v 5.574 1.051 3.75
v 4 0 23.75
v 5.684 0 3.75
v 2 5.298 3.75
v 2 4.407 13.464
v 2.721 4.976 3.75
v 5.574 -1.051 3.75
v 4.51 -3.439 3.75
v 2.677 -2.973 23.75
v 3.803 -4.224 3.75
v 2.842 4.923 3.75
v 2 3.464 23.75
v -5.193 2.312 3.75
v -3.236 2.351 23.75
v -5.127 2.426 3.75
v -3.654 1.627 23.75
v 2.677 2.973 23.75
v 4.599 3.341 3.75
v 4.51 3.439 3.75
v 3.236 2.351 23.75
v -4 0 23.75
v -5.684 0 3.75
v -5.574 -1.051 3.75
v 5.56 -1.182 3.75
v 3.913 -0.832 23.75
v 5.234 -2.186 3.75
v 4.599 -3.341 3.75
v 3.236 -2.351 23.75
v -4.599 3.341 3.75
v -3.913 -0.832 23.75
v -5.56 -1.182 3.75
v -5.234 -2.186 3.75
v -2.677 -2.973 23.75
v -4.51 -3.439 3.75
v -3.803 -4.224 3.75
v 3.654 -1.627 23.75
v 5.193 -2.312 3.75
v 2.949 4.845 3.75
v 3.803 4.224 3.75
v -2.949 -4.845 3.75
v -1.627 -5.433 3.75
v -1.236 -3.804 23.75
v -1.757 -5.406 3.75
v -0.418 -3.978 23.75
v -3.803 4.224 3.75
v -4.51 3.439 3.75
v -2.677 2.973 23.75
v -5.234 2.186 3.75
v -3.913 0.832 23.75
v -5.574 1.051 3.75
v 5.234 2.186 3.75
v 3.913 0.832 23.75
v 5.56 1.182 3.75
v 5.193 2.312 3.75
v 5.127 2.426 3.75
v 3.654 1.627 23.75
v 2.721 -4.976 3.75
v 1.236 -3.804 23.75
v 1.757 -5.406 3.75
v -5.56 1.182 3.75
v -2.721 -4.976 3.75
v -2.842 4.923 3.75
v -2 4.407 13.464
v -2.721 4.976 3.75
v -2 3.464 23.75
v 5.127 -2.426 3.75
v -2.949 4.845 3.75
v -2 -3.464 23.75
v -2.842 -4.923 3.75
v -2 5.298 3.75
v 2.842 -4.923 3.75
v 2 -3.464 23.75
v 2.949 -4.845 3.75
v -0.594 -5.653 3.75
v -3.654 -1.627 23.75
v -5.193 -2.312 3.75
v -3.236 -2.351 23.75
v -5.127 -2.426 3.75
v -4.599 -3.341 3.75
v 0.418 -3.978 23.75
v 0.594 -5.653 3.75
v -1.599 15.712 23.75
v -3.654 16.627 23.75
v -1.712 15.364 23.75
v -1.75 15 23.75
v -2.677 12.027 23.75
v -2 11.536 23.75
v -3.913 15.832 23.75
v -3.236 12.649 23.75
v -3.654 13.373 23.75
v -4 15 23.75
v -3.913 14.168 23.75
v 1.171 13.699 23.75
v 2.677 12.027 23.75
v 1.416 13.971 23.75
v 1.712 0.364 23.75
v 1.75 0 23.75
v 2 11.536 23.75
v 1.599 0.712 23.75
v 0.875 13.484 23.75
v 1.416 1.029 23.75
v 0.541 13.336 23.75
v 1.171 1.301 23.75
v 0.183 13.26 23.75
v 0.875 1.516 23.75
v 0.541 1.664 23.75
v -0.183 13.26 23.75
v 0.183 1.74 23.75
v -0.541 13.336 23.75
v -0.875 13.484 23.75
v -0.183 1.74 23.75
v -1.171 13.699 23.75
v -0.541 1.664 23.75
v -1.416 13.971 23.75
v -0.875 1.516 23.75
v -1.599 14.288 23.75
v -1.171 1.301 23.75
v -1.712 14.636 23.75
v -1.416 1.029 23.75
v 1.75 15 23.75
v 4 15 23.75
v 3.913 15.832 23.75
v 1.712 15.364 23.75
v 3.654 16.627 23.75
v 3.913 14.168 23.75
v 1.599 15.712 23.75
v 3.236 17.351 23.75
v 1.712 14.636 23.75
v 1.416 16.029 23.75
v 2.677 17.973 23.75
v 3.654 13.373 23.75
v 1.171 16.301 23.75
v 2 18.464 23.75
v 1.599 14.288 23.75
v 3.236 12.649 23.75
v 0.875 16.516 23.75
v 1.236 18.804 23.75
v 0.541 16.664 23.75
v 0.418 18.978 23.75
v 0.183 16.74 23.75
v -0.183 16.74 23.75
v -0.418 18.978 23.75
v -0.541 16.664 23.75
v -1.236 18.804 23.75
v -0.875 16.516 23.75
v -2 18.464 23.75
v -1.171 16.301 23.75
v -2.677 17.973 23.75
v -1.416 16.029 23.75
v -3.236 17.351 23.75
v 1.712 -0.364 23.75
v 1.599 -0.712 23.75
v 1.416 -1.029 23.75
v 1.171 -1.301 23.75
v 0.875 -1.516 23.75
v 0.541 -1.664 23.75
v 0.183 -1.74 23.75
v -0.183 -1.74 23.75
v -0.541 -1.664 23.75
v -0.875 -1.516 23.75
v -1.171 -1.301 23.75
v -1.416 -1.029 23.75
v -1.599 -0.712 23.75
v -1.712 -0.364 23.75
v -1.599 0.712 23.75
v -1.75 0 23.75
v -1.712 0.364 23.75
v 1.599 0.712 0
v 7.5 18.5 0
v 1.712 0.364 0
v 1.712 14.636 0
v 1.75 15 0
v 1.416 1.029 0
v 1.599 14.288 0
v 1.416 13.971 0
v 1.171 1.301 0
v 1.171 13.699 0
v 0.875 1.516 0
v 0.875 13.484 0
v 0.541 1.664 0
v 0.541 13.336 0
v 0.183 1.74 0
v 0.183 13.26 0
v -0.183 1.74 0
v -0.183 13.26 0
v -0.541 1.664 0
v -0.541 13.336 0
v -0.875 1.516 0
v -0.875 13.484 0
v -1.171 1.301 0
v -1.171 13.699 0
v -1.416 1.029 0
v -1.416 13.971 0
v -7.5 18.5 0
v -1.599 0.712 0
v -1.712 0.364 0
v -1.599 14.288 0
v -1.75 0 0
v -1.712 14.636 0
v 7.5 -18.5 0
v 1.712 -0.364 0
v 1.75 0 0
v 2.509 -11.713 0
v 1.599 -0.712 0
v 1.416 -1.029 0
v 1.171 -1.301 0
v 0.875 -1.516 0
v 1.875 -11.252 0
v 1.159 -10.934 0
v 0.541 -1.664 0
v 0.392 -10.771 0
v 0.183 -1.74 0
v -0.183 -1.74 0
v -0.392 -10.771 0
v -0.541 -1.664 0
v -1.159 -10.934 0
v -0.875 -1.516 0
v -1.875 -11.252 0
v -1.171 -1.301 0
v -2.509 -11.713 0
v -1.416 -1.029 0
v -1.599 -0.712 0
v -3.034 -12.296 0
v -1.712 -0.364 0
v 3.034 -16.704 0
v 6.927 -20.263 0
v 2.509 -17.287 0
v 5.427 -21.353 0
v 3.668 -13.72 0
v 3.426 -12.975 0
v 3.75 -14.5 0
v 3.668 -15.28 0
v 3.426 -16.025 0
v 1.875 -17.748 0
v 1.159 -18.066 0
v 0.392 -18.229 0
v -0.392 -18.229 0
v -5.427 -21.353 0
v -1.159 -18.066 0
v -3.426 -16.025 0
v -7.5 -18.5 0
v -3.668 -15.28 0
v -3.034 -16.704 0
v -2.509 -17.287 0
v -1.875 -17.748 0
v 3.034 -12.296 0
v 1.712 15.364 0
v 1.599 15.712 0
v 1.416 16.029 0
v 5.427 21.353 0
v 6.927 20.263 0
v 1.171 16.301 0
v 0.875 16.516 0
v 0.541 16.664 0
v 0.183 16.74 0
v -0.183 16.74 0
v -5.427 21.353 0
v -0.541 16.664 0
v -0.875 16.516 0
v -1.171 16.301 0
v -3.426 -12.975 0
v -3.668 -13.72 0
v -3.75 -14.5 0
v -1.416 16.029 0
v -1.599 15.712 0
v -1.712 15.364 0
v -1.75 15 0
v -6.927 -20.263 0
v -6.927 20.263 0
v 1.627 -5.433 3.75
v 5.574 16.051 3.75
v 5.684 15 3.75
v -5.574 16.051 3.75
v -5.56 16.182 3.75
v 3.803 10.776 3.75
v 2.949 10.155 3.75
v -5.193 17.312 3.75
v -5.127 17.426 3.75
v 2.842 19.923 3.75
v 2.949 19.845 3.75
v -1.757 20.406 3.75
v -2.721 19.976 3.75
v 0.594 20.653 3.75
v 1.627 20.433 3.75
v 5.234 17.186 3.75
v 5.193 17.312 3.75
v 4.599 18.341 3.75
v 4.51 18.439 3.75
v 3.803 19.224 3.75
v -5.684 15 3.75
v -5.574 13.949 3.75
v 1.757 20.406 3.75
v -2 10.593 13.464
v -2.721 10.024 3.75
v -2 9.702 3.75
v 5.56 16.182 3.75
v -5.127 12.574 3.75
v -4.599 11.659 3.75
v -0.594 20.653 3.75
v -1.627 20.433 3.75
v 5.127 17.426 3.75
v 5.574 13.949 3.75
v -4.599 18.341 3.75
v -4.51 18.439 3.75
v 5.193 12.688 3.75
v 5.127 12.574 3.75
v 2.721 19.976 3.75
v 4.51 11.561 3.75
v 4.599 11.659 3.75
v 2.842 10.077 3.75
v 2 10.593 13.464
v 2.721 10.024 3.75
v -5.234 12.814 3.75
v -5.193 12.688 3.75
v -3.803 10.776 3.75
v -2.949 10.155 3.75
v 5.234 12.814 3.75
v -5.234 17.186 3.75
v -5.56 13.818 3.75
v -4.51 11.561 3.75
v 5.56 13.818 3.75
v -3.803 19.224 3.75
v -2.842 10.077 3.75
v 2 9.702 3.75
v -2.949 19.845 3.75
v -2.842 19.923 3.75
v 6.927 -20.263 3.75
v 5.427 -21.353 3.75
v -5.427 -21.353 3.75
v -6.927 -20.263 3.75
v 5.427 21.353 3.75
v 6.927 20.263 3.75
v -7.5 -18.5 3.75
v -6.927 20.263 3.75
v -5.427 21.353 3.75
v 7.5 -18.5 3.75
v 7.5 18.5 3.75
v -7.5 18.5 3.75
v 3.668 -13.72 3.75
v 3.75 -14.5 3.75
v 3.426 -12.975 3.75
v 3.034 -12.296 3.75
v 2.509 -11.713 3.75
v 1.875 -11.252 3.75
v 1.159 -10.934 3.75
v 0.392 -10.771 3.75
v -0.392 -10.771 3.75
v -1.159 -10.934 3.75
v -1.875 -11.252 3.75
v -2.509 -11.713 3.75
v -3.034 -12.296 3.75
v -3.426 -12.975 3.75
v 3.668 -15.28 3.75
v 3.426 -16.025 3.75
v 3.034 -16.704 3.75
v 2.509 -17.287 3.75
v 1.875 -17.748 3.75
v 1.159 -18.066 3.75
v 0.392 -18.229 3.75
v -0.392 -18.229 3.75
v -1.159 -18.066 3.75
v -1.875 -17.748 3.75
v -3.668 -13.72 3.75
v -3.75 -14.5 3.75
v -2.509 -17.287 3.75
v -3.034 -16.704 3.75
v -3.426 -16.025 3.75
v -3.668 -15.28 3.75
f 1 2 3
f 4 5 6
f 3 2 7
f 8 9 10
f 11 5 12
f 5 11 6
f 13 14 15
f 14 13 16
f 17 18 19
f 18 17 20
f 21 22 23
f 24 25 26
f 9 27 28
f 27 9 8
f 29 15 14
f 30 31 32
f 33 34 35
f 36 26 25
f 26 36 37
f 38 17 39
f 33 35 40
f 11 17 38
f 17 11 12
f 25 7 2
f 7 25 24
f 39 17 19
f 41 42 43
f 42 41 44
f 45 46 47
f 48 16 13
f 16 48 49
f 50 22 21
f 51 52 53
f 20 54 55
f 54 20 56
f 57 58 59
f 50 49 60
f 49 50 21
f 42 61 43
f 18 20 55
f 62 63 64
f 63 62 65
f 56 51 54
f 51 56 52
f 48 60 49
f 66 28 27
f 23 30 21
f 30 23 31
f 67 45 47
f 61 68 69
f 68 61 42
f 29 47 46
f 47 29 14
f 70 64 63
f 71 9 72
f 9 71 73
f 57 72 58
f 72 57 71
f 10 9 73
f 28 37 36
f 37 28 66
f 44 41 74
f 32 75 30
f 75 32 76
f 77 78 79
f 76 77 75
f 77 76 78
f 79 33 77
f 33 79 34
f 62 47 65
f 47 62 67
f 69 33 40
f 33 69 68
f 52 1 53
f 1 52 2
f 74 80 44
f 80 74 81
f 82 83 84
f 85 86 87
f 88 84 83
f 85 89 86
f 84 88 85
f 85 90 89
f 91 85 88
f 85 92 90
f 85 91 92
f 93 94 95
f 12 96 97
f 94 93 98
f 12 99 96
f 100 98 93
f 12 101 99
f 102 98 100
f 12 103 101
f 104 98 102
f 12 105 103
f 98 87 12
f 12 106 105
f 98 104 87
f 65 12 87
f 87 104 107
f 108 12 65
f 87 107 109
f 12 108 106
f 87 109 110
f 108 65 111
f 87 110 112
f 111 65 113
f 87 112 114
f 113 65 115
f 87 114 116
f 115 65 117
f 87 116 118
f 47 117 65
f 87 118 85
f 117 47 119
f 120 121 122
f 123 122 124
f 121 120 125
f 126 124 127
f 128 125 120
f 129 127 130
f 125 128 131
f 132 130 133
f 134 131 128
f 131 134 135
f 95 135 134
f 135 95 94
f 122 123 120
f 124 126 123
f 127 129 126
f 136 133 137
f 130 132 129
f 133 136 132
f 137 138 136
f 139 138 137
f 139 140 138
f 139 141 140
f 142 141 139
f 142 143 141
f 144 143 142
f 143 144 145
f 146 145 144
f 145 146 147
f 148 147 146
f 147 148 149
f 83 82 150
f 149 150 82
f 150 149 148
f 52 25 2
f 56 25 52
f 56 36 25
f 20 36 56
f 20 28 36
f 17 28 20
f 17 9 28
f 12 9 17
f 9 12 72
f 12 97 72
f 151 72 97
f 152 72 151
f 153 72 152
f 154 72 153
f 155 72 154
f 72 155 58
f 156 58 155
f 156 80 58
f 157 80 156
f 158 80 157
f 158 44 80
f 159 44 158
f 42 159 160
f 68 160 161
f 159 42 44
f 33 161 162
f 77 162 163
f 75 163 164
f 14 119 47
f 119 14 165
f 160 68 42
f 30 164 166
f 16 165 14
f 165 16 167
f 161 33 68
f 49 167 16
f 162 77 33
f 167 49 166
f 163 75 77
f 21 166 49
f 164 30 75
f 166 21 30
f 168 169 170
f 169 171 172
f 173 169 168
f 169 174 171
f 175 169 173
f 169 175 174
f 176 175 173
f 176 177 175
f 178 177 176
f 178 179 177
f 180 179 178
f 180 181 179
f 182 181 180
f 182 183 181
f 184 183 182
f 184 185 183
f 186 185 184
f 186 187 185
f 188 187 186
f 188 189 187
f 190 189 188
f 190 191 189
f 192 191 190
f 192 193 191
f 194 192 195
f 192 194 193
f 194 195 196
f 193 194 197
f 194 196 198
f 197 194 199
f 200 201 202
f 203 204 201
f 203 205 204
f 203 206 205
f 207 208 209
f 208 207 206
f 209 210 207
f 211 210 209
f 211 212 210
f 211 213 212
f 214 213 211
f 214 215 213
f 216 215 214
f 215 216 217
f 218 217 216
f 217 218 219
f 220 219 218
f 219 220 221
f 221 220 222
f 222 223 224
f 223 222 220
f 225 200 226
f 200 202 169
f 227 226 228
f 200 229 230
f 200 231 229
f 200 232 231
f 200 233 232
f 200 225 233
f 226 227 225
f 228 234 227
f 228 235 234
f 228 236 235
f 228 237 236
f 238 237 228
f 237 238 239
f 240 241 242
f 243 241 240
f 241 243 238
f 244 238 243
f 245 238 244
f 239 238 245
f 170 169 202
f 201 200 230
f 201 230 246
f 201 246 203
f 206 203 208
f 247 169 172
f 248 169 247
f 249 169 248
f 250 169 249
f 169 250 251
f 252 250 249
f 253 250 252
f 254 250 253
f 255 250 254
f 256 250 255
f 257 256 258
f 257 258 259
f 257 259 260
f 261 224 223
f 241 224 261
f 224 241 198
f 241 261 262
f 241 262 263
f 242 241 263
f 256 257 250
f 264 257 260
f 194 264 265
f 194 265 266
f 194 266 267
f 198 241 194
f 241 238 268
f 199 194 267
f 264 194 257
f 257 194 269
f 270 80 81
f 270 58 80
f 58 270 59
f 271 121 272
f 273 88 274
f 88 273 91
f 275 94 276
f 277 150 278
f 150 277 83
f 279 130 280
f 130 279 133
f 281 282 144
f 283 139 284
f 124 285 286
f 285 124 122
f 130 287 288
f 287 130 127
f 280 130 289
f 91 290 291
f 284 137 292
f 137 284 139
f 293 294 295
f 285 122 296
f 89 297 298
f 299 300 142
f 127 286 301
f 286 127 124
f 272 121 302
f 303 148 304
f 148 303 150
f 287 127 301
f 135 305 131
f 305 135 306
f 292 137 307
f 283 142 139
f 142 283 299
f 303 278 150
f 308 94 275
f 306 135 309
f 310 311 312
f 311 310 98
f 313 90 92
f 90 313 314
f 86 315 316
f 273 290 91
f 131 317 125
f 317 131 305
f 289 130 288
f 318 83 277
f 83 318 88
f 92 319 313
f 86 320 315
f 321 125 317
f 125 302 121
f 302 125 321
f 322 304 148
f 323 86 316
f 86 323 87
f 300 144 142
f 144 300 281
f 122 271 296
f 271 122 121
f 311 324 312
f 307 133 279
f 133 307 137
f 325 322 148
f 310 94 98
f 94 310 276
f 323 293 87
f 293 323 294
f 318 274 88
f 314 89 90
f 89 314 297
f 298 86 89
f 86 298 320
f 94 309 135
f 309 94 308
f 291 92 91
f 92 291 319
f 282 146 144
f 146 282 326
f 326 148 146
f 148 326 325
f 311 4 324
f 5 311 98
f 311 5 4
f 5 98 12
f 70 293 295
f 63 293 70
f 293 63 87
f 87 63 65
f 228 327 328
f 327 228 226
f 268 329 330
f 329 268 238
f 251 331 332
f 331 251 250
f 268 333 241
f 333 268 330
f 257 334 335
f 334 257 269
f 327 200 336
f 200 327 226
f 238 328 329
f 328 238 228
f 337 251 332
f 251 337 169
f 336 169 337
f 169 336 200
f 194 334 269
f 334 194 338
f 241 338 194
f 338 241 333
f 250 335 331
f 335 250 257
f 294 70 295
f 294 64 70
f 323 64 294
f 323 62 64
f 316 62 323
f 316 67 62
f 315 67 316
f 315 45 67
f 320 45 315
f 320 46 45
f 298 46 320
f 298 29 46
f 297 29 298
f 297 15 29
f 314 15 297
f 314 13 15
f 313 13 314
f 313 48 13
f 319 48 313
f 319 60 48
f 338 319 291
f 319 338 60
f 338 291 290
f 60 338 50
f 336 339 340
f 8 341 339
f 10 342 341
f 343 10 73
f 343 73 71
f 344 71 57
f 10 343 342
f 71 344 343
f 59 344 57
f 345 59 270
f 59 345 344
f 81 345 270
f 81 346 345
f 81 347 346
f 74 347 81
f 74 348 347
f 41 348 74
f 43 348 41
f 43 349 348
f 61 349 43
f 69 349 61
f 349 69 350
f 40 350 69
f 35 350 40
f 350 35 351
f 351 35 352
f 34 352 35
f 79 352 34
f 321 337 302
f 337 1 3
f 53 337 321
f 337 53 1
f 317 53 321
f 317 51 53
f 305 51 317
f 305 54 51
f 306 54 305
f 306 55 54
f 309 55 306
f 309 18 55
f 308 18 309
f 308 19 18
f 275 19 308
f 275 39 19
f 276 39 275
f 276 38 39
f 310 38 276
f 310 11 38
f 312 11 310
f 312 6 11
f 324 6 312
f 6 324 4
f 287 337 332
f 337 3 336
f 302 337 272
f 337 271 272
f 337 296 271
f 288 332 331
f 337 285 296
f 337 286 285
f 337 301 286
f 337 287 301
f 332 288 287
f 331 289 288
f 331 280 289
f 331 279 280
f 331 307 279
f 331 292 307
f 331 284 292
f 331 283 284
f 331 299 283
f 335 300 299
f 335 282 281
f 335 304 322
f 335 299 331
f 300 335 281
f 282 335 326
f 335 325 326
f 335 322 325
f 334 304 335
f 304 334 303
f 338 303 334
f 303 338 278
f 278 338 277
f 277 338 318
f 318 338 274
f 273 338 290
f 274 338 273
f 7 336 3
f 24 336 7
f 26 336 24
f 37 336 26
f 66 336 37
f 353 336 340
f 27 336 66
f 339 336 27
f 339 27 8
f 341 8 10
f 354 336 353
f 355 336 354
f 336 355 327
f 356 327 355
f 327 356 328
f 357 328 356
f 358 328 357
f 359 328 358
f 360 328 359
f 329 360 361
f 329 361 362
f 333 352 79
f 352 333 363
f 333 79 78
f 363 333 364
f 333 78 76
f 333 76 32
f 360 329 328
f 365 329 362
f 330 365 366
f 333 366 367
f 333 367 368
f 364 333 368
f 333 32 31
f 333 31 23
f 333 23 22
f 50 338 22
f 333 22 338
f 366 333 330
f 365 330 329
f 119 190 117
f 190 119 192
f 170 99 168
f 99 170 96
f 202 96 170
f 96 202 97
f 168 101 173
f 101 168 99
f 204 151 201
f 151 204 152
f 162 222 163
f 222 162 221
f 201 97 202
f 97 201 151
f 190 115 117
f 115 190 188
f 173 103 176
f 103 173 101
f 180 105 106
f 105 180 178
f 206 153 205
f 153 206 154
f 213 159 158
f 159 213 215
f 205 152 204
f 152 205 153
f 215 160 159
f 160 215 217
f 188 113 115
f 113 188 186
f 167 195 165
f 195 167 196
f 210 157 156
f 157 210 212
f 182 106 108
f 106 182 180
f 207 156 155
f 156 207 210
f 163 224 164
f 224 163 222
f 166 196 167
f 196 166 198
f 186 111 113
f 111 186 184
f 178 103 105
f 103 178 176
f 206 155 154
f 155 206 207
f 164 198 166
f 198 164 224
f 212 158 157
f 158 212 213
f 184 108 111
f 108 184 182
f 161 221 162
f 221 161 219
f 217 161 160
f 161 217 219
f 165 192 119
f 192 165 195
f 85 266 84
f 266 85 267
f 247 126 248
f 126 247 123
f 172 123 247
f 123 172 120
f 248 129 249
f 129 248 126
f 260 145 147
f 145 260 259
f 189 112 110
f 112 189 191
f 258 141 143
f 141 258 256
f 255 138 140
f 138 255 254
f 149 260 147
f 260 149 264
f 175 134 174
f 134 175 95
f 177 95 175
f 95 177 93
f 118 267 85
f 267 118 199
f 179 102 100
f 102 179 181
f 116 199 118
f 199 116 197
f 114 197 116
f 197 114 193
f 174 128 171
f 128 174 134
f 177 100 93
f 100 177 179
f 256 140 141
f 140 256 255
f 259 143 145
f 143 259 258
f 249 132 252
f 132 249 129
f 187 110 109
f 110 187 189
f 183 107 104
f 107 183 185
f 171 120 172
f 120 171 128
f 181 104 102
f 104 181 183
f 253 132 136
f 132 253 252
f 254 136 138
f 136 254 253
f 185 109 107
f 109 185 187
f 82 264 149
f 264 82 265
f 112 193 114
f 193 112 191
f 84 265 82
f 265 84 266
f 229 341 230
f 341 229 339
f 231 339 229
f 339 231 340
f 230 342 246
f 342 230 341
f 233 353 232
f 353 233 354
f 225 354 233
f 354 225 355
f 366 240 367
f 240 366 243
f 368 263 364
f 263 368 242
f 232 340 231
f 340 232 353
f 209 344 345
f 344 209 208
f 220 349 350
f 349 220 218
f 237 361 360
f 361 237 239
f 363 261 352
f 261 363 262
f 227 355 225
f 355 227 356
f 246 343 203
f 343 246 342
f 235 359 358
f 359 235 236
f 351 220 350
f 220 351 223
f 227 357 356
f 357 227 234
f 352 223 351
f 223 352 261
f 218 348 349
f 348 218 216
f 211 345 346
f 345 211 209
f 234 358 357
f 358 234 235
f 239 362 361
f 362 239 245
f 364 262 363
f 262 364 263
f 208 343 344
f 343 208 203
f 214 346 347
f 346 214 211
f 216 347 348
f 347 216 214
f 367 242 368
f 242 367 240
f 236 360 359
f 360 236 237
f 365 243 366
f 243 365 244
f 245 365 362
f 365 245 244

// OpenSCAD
// file: dronePlates.scad
/**
 * dronePlates.scad
 * Plate library
 *
 * GNU GPL V3
 * @author: Victor Potenciano
 */

m3Rad = 3.4/2;
cornerR = 4;

/**
 *
 */
module helperDisk(diameter) {
	cylinder(r = diameter/2, h = 0.6, $fn=20);
}

/**
 *
 */
module roundedRect(size, radius) {
	x = size[0];
	y = size[1];
	z = size[2];

	linear_extrude(height=z)
	hull() {
	// place 4 circles in the corners, with the given radius
	translate([(-x/2)+(radius/2), (-y/2)+(radius/2), 0]){ circle(r=radius); }
	translate([(x/2)-(radius/2), (-y/2)+(radius/2), 0]){ circle(r=radius); }
	translate([(-x/2)+(radius/2), (y/2)-(radius/2), 0]){ circle(r=radius); }
	translate([(x/2)-(radius/2), (y/2)-(radius/2), 0]){ circle(r=radius); }
	}
}

/**
 * rounded rectangle triangle with corner at origin
 */
module roundedTriangle(size, radius) {
	x = size[0];
	y = size[1];
	z = size[2];

	linear_extrude(height=z)
	hull() {
	translate([radius, radius, 0]){ circle(r=radius); }
	translate([x-radius, radius, 0]){ circle(r=radius); }
	translate([radius, y-radius, 0]){ circle(r=radius); }
	}
}

/**
 *
 */
module roundRectPlate(w, l, plateThick=3) {
	difference(){
		roundedRect([l+m3Rad*1.75,w+m3Rad*1.75,plateThick], cornerR);
		translate([l/2, w/2, -0.5]) { cylinder(h = plateThick+1, r = m3Rad, $fn=30); }
		translate([-l/2, w/2, -0.5]) { cylinder(h = plateThick+1, r = m3Rad, $fn=30); }
		translate([l/2, -w/2, -0.5]) { cylinder(h = plateThick+1, r = m3Rad, $fn=30); }
		translate([-l/2, -w/2, -0.5]) { cylinder(h = plateThick+1, r = m3Rad, $fn=30); }
	}
}

/**
 *
 */
module crossSquarePlate(l, thick=3) {
	inDist = cornerR*2+4;
	trianL = sqrt((l*l)/2)-inDist;
	centerR = 4;

	difference(){
		roundRectPlate(l, l, thick);
		translate([0, centerR, -0.5]) { 
			rotate([0,0,45]){ roundedTriangle([trianL,trianL,thick+1], cornerR-2); }
		}
		translate([0, -centerR, -0.5]) { 
			rotate([0,0,225]){ roundedTriangle([trianL,trianL,thick+1], cornerR-2); }
		}
		translate([-centerR, 0, -0.5]) { 
			rotate([0,0,135]){ roundedTriangle([trianL,trianL,thick+1], cornerR-2); }
		}
		translate([centerR, 0, -0.5]) { 
			rotate([0,0,-45]){ roundedTriangle([trianL,trianL,thick+1], cornerR-2); }
		}
	}
}

/**
 *
 */
module hShapePlate(w, l, thick=4) {
	inDist = cornerR*2+1;

	difference(){
		roundRectPlate(w, l, thick);
		translate([0, w/4, -0.5]) { roundedRect([l-inDist,w/2-inDist,thick+1], cornerR-2); }
		translate([0, -w/4, -0.5]) { roundedRect([l-inDist,w/2-inDist,thick+1], cornerR-2); }
	}
}

/**
 *
 */
module motorCircleMount(inDia, outDia, thick=3, extraH=false, d1=19, d2=16, holeR=m3Rad ) {
	difference(){
		cylinder(h = thick, r = outDia/2, $fn=30);
		motorCircleMountHoles(inDia, outDia, thick, extraH, d1=d1, d2=d2, holeR=holeR);
	}
}

/**
 *
 */
module motorCircleMountHoles(inDia, outDia, thick=3, extraH=false, d1=19, d2=16, d3=25, holeR=m3Rad) {
	translate([0, 0, -0.5]) { cylinder(h = thick+1, r = inDia/2, $fn=30); }

	for(i=[0:3]) {
		rotate([0,0,90*i]){
		translate([d1/2, 0, -0.5]) cylinder(h = thick+1, r = holeR, $fn=20);
		translate([d2/2, 0, -0.5]) cylinder(h = thick+1, r = holeR, $fn=20);
		translate([d2/2, -holeR, -0.5]) cube(size = [(d1-d2)/2,holeR*2,thick+1]);
		}
	}
	
	if(extraH==true){	
		for(i=[-1,1]) translate([i*d3/2, 0, -0.5]) { cylinder(h = thick+1, r = holeR, $fn=30); }
	}
}

/**
 *
 */
module motorRectMount(w, l, inDia, thick=3) {
	d1=19;
	d2=16;

	difference(){
		roundRectPlate(w, l, thick);
		translate([0, 0, -0.5]) { cylinder(h = thick+1, r = inDia/2, $fn=30); }
		translate([0, d1/2, -0.5]) { cylinder(h = thick+1, r = m3Rad, $fn=30); }
		translate([0, -d1/2, -0.5]) { cylinder(h = thick+1, r = m3Rad, $fn=30); }
		translate([d2/2, 0, -0.5]) { cylinder(h = thick+1, r = m3Rad, $fn=30); }
		translate([-d2/2, 0, -0.5]) { cylinder(h = thick+1, r = m3Rad, $fn=30); }
	}
}

/**
 *
 */
module tube(inDia, outDia, height) {
	difference(){
		cylinder(h = height, r = outDia/2, $fn=50);
		translate([0, 0, -0.5]) { cylinder(h = height+1, r = inDia/2, $fn=30); }
	}
}

/**
 *
 */
module squareTube(inDia, outDia, height) {
	translate([0,0,height/2]){
	difference(){
		cube(size = [outDia,outDia,height], center = true);
		cube(size = [inDia,inDia,height+1], center = true);
	}
	}
}

/**
 *
 */
module djiFlamewheelHoles(height) {
	a = 23;
	b = 16;
	c = 19.5;
	
	translate([a/2, c/2, 0]) { cylinder(h = height, r = m3Rad, $fn=30); }
	translate([-a/2, c/2, 0]) { cylinder(h = height, r = m3Rad, $fn=30); }
	translate([b/2, -c/2, 0]) { cylinder(h = height, r = m3Rad, $fn=30); }
	translate([-b/2, -c/2, 0]) { cylinder(h = height, r = m3Rad, $fn=30); }
}

/**
 *
 */
module djiFlamewheelHolesBotton(height) {
	a1 = 21;
	c = 19.5;
	
	translate([a1/2, c/2, 0]) { cylinder(h = height, r = m3Rad, $fn=30); }
	translate([-a1/2, c/2, 0]) { cylinder(h = height, r = m3Rad, $fn=30); }
}

/**
 *
 */
module propeller(size){
union(){
difference(){
	cylinder(h = 3, r = size/2, center=true, $fn=30);
	cylinder(h = 3.1, r = size/2-2, center=true, $fn=30); 
}
for( i = [-1,1] ){
rotate([0,0,45*i]){ cube(size = [size,4,1], center = true); }
}
}
}

/**
 *
 */
module slot(length, height, rad){
for(i=[-1,1]) translate([i*length/2,0,0]) cylinder(h = height, r = rad, $fn=30);
translate([0,0,height/2]) cube(size = [length,rad*2,height], center = true);
}

 

////////////////////////
// Examples:
////////////////////////

motorCircleMount(8, 25, 3.5);

//roundedRect([50,50,3], 4);

//hShapePlate(79, 25);

//rotate([0,0,45]){roundedTriangle([40,40,3], 4);}

//crossSquarePlate(45, 4);

/*
union(){
motorRectMount(21, 18, 8, 4);
translate([9, 10.5, 0]) {tube(m3Rad*2, 6.5, 6);}
}
*/

/*
difference(){
union(){
hShapePlate(50, 30, 3.5);
translate([-4,-25,0]){cube(size = [8,50,3.5]);}
rotate([0, 0, 45]) {motorCircleMount(8, 35, 3.5);}
}
cylinder(h = 10, r = 4, $fn=100, center=true);
}
*/

//rotate([90,0,0]){ tube(5,10,20); }
//translate([20,0,0]){ squareTube(5, 10, 20); }
// main file
/**
 * adaptor for gopro attachment
 */

use <dronePlates.scad>

m3Rad = 3.5/2;
plateThick = 3.75;

difference(){
union(){

translate([-2,3,0]) cube(size=[4,9,20+plateThick]);
roundedRect([12,40,plateThick],3);
for(i=[0,1]) translate([0,i*15,0]) cylinder(h=20+plateThick,r1=6,r2=4,$fn=30);


}//union

for(i=[0,1]) translate([0,i*15,-0.5]) cylinder(h=30,r=m3Rad,$fn=30);
translate([0,-(22-15/2),-0.5]) cylinder(h=plateThick+1,r=7.5/2,$fn=30);

}//diff
